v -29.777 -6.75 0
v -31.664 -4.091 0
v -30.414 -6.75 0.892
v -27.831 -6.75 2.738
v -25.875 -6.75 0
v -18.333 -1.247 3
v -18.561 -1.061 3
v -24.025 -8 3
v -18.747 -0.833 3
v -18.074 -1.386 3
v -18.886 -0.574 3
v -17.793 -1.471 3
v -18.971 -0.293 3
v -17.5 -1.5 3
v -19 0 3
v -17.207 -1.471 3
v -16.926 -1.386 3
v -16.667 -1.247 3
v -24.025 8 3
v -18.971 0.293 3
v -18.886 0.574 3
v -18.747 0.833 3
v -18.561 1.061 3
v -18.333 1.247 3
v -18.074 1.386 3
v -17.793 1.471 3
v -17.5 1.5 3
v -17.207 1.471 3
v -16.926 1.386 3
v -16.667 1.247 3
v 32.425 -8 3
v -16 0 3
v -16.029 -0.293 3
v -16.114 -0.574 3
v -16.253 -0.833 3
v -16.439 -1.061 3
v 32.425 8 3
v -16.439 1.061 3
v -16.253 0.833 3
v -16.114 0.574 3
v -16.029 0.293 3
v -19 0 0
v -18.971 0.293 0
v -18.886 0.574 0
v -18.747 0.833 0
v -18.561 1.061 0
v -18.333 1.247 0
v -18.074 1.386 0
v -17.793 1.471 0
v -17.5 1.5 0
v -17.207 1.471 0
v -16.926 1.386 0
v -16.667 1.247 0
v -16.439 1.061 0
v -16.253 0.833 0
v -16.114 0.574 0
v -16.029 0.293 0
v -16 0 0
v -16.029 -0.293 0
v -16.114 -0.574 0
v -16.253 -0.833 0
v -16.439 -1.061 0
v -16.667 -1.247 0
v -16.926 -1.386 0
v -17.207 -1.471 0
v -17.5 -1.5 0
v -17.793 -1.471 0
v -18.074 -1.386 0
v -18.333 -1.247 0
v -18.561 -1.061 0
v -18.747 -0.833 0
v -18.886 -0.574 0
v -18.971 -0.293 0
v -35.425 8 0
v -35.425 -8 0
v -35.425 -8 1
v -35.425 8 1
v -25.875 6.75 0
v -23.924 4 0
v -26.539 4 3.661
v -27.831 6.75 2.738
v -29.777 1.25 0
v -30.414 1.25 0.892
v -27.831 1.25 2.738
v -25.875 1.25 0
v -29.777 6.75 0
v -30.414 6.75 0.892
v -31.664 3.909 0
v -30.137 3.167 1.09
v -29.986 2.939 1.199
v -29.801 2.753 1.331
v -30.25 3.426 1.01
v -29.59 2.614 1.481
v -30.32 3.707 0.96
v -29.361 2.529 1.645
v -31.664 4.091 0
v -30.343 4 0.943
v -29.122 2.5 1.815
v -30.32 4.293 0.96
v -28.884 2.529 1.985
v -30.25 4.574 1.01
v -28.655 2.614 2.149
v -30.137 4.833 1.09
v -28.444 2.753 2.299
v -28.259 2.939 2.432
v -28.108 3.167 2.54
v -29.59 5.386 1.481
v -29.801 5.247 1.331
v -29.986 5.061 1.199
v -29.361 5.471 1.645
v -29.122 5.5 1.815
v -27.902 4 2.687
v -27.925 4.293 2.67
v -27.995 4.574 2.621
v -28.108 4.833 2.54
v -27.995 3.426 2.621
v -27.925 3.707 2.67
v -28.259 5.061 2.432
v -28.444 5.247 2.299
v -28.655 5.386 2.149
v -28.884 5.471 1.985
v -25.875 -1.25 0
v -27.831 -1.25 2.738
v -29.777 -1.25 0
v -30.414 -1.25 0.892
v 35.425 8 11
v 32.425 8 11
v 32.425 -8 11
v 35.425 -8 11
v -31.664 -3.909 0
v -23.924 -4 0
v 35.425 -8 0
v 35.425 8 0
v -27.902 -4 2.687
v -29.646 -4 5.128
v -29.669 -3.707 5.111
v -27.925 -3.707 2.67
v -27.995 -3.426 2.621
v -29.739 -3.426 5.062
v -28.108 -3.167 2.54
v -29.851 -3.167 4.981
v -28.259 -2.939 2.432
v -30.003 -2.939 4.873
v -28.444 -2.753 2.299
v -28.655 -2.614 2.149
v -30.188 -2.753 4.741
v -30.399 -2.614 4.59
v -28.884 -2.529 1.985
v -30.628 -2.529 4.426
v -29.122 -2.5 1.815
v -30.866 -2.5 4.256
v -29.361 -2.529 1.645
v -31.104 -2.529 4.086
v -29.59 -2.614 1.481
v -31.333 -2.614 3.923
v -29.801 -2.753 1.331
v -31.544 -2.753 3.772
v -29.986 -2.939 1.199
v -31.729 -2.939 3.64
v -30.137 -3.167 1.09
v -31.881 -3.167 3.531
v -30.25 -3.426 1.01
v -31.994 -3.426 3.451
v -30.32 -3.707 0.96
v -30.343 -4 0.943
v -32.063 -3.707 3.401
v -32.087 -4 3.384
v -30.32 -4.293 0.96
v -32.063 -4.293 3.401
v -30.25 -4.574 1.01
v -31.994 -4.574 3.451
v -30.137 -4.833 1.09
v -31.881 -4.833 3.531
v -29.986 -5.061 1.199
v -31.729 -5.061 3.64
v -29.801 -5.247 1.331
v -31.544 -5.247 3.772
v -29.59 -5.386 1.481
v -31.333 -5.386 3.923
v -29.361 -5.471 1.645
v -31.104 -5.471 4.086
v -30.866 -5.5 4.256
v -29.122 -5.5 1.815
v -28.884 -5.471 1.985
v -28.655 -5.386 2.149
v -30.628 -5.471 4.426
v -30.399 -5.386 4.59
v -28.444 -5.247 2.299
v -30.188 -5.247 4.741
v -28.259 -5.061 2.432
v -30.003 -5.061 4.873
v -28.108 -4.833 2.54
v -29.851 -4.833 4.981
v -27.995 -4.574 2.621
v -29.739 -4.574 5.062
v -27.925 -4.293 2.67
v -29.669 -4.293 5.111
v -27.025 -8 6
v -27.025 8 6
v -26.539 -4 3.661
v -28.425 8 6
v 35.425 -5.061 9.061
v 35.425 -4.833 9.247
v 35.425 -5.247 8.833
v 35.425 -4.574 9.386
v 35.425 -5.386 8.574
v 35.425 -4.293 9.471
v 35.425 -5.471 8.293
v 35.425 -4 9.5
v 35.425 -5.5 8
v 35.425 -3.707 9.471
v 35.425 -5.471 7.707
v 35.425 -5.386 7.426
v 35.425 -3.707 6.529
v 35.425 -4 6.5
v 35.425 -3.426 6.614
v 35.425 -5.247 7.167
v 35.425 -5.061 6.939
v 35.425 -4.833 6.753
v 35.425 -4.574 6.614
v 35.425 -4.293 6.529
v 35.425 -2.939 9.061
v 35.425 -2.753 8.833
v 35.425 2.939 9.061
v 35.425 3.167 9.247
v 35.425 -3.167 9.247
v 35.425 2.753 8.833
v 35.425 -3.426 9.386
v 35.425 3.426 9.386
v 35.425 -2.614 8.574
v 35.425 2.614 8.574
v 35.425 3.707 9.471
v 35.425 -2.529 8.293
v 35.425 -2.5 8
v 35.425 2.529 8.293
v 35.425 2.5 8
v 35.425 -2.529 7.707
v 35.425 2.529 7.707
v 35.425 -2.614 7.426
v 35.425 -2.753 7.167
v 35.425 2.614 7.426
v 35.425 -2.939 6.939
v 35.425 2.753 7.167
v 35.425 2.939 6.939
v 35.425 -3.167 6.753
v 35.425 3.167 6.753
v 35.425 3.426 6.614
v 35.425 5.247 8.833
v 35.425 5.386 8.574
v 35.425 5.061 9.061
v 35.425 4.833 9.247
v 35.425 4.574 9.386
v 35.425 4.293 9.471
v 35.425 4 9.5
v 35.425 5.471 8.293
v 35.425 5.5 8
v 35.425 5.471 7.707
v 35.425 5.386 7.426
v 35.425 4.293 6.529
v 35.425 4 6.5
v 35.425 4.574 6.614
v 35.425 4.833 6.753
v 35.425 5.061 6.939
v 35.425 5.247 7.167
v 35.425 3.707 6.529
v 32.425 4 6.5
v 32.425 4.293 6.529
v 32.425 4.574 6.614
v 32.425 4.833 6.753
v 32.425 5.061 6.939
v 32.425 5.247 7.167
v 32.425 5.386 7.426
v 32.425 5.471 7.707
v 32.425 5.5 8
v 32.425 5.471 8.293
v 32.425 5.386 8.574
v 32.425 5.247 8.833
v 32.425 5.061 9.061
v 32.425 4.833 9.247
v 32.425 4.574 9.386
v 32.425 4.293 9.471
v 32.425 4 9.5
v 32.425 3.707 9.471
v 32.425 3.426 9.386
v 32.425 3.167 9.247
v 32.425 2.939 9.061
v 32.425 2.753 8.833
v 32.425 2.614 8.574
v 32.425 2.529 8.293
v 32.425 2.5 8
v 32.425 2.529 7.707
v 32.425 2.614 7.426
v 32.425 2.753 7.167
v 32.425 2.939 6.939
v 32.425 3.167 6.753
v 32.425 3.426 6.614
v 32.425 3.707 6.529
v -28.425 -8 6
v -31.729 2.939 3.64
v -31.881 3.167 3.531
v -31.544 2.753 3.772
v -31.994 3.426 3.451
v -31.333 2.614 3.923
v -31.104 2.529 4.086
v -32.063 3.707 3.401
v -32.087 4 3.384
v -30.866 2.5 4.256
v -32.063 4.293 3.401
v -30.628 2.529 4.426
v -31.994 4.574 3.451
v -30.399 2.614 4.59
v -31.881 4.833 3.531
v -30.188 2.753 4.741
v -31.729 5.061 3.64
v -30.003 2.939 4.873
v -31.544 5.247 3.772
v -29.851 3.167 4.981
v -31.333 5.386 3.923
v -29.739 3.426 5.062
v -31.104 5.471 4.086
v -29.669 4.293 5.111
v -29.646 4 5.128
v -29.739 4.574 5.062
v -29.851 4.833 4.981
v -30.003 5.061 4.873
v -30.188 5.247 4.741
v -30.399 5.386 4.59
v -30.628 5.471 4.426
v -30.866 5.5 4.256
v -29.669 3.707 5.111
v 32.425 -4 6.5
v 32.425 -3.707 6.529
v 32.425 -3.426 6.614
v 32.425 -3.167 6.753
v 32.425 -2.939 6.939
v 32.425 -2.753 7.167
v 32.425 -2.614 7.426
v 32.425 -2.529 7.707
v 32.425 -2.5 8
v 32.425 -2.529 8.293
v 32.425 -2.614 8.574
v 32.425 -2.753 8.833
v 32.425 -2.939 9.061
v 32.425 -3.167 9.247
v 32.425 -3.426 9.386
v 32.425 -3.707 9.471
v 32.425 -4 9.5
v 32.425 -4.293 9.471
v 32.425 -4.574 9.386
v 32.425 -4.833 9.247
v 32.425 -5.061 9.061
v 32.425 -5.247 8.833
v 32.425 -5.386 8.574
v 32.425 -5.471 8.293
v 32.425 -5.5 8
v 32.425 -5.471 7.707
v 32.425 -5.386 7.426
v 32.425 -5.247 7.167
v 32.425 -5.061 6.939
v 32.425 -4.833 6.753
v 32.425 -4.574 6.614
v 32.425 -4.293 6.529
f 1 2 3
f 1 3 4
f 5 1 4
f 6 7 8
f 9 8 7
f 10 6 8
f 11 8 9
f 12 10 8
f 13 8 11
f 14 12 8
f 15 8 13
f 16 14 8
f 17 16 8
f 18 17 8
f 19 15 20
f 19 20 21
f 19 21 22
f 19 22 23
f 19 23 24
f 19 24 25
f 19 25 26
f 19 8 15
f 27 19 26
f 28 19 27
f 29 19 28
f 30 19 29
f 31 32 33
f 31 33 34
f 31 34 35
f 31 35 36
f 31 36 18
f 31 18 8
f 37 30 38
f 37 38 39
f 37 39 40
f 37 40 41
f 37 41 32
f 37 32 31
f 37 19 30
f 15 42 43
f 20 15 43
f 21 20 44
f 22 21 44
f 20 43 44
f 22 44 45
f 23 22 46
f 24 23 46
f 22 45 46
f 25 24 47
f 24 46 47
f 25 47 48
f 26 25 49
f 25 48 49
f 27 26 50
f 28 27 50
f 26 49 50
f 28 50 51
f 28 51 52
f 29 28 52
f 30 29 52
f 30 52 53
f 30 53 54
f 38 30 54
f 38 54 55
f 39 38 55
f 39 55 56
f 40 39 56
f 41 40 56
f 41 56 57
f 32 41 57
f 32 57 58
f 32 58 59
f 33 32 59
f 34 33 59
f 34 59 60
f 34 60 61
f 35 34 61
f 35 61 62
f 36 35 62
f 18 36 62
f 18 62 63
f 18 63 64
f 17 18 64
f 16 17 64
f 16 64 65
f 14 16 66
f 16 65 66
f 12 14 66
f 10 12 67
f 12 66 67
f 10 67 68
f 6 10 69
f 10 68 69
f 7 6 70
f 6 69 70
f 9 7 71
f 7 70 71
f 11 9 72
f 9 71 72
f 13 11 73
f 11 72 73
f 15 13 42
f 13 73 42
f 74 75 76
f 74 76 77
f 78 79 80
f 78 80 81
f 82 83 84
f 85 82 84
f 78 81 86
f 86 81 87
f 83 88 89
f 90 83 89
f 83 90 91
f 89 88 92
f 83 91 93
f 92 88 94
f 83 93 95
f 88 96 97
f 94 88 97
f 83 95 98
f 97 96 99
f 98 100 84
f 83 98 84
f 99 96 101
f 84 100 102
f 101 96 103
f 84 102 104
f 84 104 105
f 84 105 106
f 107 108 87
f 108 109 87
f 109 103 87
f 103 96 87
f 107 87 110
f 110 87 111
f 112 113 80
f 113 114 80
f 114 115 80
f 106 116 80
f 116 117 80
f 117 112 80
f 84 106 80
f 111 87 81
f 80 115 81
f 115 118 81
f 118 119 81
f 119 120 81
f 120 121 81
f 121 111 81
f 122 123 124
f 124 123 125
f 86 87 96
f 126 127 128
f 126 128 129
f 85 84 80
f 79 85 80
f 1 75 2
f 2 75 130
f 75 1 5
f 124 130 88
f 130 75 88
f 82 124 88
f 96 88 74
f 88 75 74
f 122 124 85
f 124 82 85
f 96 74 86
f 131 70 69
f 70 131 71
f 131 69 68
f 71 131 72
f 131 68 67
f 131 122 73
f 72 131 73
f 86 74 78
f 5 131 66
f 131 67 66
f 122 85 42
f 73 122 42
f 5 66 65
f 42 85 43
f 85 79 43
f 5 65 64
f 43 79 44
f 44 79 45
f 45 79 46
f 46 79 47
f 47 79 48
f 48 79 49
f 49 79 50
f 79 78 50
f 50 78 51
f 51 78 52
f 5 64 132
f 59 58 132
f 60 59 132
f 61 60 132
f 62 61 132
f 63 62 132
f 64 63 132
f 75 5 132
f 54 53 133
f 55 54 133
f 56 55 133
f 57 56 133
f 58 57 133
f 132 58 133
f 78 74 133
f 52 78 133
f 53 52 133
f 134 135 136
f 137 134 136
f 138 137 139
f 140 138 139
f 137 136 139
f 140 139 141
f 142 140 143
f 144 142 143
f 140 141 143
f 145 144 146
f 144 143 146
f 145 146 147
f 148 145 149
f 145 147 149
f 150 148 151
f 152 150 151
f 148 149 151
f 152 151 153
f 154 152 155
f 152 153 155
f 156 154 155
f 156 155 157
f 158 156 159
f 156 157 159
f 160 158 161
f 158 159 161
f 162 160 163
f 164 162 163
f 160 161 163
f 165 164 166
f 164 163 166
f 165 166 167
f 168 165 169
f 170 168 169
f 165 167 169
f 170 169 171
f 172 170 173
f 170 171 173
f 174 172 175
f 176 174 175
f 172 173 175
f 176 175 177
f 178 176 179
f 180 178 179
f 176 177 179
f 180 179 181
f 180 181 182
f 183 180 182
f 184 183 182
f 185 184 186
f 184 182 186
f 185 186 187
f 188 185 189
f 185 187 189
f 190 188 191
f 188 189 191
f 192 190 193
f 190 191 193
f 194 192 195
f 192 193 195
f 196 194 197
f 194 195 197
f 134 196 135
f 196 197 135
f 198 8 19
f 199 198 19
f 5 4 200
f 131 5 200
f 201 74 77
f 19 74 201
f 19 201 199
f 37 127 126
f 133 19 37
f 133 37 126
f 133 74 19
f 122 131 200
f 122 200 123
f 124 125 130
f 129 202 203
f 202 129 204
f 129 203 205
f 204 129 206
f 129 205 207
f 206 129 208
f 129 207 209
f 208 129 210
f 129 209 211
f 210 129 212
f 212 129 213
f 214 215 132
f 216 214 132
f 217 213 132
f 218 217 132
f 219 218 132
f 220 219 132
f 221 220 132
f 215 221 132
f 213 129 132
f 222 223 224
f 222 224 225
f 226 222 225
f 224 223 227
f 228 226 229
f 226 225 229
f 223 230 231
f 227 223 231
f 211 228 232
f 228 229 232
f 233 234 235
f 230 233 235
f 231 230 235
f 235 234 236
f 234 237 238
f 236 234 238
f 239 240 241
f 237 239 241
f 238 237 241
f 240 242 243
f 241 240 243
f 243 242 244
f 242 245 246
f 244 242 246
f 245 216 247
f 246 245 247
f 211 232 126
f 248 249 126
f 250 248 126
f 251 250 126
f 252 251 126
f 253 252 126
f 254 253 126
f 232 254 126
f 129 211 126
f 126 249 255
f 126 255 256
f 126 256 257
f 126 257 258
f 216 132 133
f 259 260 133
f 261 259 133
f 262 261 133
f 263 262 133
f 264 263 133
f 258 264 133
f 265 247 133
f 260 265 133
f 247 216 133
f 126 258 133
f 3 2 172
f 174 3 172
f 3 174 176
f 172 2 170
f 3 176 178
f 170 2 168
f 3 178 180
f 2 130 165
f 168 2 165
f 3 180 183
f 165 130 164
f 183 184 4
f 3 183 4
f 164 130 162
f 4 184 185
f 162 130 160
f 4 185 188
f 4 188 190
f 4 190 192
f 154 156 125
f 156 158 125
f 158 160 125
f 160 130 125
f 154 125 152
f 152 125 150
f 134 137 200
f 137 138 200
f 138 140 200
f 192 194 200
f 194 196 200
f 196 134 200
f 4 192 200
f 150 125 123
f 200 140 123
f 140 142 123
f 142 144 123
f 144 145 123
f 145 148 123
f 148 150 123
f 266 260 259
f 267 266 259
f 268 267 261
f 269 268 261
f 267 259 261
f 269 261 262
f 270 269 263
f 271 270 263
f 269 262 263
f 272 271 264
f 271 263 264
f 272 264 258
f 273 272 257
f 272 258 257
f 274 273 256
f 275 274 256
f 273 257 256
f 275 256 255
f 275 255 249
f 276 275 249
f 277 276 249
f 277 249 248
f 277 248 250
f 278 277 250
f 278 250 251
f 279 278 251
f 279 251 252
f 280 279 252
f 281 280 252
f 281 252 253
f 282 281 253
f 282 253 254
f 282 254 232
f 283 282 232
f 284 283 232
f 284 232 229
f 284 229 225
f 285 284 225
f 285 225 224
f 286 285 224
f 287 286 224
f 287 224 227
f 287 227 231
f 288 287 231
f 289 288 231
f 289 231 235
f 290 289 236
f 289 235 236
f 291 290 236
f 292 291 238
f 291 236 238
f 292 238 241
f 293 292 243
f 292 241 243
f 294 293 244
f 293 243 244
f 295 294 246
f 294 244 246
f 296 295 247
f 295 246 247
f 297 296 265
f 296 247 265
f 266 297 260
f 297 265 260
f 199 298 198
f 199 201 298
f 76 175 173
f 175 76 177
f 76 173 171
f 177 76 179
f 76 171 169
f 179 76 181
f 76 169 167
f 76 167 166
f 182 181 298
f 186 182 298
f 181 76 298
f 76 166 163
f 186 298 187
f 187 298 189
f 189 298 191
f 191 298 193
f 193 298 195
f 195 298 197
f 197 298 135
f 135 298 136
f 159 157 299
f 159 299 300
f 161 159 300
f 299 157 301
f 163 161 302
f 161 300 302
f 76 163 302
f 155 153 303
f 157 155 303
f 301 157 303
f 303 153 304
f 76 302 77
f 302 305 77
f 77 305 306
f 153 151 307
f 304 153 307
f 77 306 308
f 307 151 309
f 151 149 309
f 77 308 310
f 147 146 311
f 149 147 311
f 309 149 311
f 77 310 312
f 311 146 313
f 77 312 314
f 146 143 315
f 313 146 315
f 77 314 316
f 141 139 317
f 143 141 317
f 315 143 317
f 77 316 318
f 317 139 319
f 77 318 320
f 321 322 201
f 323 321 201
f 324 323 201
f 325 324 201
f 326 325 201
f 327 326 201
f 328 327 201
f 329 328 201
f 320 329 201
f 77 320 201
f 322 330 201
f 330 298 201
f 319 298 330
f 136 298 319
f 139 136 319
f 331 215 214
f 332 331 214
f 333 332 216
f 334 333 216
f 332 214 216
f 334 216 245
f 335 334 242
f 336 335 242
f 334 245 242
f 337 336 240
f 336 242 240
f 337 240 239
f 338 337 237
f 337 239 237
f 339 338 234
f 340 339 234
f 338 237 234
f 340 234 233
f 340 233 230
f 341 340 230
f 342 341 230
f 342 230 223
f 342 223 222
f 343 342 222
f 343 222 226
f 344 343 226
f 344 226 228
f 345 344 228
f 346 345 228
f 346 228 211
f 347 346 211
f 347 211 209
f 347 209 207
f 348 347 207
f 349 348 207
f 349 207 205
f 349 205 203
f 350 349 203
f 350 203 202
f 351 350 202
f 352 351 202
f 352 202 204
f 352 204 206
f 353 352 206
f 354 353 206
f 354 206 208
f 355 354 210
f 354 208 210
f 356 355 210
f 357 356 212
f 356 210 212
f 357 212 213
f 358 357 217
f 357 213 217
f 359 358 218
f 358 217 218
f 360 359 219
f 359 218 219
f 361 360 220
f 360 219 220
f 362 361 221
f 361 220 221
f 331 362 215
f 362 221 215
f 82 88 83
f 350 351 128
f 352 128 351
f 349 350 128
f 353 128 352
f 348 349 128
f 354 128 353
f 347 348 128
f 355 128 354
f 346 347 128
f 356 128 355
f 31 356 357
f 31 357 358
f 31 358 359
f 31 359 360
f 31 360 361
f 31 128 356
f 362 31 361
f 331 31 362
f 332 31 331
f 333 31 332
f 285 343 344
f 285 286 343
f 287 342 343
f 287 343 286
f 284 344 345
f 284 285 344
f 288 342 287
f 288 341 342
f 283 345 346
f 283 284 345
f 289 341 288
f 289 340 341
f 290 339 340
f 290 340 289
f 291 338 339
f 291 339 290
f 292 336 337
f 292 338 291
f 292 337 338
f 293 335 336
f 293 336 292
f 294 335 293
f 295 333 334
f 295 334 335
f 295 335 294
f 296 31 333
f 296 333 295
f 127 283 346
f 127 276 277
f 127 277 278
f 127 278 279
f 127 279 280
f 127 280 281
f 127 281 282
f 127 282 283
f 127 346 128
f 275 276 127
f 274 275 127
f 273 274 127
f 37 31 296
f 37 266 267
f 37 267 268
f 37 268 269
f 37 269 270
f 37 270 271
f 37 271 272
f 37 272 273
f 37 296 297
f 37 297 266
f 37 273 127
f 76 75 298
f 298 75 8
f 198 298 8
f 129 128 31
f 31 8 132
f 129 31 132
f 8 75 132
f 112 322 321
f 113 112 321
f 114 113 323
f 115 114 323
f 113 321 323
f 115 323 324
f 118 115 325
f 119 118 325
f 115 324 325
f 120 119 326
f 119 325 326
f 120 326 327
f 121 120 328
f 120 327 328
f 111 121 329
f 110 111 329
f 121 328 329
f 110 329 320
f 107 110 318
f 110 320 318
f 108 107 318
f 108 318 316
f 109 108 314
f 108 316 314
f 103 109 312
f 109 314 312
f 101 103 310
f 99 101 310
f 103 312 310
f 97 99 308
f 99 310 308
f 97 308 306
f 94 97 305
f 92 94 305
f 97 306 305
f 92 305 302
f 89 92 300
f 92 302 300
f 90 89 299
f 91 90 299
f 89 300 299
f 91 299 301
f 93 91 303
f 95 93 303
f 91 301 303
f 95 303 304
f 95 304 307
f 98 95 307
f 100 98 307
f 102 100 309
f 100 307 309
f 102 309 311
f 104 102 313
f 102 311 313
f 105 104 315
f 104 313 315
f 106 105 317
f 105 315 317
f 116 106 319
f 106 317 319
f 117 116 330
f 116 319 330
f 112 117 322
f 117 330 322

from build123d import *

# Parameters (mm, degrees)
SKETCH1_W           = 70.85
SKETCH1_H           = 16
BOSS_EXTRUDE1_DEPTH = 3
SKETCH2_W           = 8.4
SKETCH2_H           = 16
BOSS_EXTRUDE2_DEPTH = 3
CHAMFER1_SIZE       = 5
CHAMFER1_SIZE2      = 7
SKETCH3_R           = 1.5
CUT_EXTRUDE1_DEPTH  = 3
CHAMFER2_SIZE       = 3
CUT_EXTRUDE2_START  = -3
CUT_EXTRUDE2_DEPTH  = 8
SKETCH5_W           = 3
SKETCH5_H           = 16
BOSS_EXTRUDE3_DEPTH = 8
SKETCH6_R           = 1.5
CUT_EXTRUDE3_DEPTH  = 8
SKETCH7_R           = 1.5
CUT_EXTRUDE4_DEPTH  = 10


with BuildPart() as part:
    # Sketch1 → Boss-Extrude1 (new body)
    with BuildSketch(Plane.XY):
        Rectangle(SKETCH1_W, SKETCH1_H)
    extrude(amount=BOSS_EXTRUDE1_DEPTH)

    # Sketch2 → Boss-Extrude2 (add)
    with BuildSketch(Plane.XY.offset(3)):
        with Locations((-31.225, 0)):
            Rectangle(SKETCH2_W, SKETCH2_H)
    extrude(amount=BOSS_EXTRUDE2_DEPTH)

    # Chamfer1
    chamfer1_edges = [part.edges().sort_by_distance(p)[0] for p in [
        (-35.425, 0, 6),
    ]]
    chamfer1_side = [part.faces().sort_by_distance(p)[0] for p in [
        (-35.425, 0, 3),
    ]]
    chamfer(chamfer1_edges, length=CHAMFER1_SIZE, length2=CHAMFER1_SIZE2, reference=chamfer1_side[0])

    # Sketch3 → Cut-Extrude1 (cut)
    with BuildSketch(Plane(origin=(-12.440878378, 0, 17.41722973), x_dir=(0.8137334712067354, 0, 0.5812381937190957), z_dir=(-0.5812381937190957, 0, 0.8137334712067354))):
        with Locations((-22.642944757, 4)):
            Circle(SKETCH3_R)
        with Locations((-22.642944757, -4)):
            Circle(SKETCH3_R)
    extrude(amount=-CUT_EXTRUDE1_DEPTH, mode=Mode.SUBTRACT)

    # Chamfer2
    chamfer2_edges = [part.edges().sort_by_distance(p)[0] for p in [
        (-27.025, 0, 3),
    ]]
    chamfer(chamfer2_edges, length=CHAMFER2_SIZE - 0.0001)  # a hair under: the kernel refuses the full size

    # Sketch4 → Cut-Extrude2 (cut)
    with BuildSketch(Plane(origin=(-12.440878378, 0, 17.41722973), x_dir=(0.8137334712067354, 0, 0.5812381937190959), z_dir=(-0.5812381937190958, 0, 0.8137334712067353)).offset(CUT_EXTRUDE2_START)):
        Polygon((-19.467518276, 4), (-21.055231516, 6.75), (-24.230657997, 6.75), (-25.818371237, 4), (-24.230657997, 1.25), (-21.055231516, 1.25), align=None)
        Polygon((-19.467518276, -4), (-21.055231516, -1.25), (-24.230657997, -1.25), (-25.818371237, -4), (-24.230657997, -6.75), (-21.055231516, -6.75), align=None)
    extrude(amount=-CUT_EXTRUDE2_DEPTH, mode=Mode.SUBTRACT)

    # Sketch5 → Boss-Extrude3 (add)
    with BuildSketch(Plane.XY.offset(3)):
        with Locations((33.925, 0)):
            Rectangle(SKETCH5_W, SKETCH5_H)
    extrude(amount=BOSS_EXTRUDE3_DEPTH)

    # Sketch6 → Cut-Extrude3 (cut)
    with BuildSketch(Plane(origin=(35.425, 0, 0), x_dir=(0, 0, -1), z_dir=(1, 0, 0))):
        with Locations((-8, 4)):
            Circle(SKETCH6_R)
        with Locations((-8, -4)):
            Circle(SKETCH6_R)
    extrude(amount=-CUT_EXTRUDE3_DEPTH, mode=Mode.SUBTRACT)

    # Sketch7 → Cut-Extrude4 (cut)
    with BuildSketch(Plane(origin=(0, 0, 0), x_dir=(-1, 0, 0), z_dir=(0, 0, -1))):
        with Locations((17.5, 0)):
            Circle(SKETCH7_R)
    extrude(amount=-CUT_EXTRUDE4_DEPTH, mode=Mode.SUBTRACT)


solid = part.part
